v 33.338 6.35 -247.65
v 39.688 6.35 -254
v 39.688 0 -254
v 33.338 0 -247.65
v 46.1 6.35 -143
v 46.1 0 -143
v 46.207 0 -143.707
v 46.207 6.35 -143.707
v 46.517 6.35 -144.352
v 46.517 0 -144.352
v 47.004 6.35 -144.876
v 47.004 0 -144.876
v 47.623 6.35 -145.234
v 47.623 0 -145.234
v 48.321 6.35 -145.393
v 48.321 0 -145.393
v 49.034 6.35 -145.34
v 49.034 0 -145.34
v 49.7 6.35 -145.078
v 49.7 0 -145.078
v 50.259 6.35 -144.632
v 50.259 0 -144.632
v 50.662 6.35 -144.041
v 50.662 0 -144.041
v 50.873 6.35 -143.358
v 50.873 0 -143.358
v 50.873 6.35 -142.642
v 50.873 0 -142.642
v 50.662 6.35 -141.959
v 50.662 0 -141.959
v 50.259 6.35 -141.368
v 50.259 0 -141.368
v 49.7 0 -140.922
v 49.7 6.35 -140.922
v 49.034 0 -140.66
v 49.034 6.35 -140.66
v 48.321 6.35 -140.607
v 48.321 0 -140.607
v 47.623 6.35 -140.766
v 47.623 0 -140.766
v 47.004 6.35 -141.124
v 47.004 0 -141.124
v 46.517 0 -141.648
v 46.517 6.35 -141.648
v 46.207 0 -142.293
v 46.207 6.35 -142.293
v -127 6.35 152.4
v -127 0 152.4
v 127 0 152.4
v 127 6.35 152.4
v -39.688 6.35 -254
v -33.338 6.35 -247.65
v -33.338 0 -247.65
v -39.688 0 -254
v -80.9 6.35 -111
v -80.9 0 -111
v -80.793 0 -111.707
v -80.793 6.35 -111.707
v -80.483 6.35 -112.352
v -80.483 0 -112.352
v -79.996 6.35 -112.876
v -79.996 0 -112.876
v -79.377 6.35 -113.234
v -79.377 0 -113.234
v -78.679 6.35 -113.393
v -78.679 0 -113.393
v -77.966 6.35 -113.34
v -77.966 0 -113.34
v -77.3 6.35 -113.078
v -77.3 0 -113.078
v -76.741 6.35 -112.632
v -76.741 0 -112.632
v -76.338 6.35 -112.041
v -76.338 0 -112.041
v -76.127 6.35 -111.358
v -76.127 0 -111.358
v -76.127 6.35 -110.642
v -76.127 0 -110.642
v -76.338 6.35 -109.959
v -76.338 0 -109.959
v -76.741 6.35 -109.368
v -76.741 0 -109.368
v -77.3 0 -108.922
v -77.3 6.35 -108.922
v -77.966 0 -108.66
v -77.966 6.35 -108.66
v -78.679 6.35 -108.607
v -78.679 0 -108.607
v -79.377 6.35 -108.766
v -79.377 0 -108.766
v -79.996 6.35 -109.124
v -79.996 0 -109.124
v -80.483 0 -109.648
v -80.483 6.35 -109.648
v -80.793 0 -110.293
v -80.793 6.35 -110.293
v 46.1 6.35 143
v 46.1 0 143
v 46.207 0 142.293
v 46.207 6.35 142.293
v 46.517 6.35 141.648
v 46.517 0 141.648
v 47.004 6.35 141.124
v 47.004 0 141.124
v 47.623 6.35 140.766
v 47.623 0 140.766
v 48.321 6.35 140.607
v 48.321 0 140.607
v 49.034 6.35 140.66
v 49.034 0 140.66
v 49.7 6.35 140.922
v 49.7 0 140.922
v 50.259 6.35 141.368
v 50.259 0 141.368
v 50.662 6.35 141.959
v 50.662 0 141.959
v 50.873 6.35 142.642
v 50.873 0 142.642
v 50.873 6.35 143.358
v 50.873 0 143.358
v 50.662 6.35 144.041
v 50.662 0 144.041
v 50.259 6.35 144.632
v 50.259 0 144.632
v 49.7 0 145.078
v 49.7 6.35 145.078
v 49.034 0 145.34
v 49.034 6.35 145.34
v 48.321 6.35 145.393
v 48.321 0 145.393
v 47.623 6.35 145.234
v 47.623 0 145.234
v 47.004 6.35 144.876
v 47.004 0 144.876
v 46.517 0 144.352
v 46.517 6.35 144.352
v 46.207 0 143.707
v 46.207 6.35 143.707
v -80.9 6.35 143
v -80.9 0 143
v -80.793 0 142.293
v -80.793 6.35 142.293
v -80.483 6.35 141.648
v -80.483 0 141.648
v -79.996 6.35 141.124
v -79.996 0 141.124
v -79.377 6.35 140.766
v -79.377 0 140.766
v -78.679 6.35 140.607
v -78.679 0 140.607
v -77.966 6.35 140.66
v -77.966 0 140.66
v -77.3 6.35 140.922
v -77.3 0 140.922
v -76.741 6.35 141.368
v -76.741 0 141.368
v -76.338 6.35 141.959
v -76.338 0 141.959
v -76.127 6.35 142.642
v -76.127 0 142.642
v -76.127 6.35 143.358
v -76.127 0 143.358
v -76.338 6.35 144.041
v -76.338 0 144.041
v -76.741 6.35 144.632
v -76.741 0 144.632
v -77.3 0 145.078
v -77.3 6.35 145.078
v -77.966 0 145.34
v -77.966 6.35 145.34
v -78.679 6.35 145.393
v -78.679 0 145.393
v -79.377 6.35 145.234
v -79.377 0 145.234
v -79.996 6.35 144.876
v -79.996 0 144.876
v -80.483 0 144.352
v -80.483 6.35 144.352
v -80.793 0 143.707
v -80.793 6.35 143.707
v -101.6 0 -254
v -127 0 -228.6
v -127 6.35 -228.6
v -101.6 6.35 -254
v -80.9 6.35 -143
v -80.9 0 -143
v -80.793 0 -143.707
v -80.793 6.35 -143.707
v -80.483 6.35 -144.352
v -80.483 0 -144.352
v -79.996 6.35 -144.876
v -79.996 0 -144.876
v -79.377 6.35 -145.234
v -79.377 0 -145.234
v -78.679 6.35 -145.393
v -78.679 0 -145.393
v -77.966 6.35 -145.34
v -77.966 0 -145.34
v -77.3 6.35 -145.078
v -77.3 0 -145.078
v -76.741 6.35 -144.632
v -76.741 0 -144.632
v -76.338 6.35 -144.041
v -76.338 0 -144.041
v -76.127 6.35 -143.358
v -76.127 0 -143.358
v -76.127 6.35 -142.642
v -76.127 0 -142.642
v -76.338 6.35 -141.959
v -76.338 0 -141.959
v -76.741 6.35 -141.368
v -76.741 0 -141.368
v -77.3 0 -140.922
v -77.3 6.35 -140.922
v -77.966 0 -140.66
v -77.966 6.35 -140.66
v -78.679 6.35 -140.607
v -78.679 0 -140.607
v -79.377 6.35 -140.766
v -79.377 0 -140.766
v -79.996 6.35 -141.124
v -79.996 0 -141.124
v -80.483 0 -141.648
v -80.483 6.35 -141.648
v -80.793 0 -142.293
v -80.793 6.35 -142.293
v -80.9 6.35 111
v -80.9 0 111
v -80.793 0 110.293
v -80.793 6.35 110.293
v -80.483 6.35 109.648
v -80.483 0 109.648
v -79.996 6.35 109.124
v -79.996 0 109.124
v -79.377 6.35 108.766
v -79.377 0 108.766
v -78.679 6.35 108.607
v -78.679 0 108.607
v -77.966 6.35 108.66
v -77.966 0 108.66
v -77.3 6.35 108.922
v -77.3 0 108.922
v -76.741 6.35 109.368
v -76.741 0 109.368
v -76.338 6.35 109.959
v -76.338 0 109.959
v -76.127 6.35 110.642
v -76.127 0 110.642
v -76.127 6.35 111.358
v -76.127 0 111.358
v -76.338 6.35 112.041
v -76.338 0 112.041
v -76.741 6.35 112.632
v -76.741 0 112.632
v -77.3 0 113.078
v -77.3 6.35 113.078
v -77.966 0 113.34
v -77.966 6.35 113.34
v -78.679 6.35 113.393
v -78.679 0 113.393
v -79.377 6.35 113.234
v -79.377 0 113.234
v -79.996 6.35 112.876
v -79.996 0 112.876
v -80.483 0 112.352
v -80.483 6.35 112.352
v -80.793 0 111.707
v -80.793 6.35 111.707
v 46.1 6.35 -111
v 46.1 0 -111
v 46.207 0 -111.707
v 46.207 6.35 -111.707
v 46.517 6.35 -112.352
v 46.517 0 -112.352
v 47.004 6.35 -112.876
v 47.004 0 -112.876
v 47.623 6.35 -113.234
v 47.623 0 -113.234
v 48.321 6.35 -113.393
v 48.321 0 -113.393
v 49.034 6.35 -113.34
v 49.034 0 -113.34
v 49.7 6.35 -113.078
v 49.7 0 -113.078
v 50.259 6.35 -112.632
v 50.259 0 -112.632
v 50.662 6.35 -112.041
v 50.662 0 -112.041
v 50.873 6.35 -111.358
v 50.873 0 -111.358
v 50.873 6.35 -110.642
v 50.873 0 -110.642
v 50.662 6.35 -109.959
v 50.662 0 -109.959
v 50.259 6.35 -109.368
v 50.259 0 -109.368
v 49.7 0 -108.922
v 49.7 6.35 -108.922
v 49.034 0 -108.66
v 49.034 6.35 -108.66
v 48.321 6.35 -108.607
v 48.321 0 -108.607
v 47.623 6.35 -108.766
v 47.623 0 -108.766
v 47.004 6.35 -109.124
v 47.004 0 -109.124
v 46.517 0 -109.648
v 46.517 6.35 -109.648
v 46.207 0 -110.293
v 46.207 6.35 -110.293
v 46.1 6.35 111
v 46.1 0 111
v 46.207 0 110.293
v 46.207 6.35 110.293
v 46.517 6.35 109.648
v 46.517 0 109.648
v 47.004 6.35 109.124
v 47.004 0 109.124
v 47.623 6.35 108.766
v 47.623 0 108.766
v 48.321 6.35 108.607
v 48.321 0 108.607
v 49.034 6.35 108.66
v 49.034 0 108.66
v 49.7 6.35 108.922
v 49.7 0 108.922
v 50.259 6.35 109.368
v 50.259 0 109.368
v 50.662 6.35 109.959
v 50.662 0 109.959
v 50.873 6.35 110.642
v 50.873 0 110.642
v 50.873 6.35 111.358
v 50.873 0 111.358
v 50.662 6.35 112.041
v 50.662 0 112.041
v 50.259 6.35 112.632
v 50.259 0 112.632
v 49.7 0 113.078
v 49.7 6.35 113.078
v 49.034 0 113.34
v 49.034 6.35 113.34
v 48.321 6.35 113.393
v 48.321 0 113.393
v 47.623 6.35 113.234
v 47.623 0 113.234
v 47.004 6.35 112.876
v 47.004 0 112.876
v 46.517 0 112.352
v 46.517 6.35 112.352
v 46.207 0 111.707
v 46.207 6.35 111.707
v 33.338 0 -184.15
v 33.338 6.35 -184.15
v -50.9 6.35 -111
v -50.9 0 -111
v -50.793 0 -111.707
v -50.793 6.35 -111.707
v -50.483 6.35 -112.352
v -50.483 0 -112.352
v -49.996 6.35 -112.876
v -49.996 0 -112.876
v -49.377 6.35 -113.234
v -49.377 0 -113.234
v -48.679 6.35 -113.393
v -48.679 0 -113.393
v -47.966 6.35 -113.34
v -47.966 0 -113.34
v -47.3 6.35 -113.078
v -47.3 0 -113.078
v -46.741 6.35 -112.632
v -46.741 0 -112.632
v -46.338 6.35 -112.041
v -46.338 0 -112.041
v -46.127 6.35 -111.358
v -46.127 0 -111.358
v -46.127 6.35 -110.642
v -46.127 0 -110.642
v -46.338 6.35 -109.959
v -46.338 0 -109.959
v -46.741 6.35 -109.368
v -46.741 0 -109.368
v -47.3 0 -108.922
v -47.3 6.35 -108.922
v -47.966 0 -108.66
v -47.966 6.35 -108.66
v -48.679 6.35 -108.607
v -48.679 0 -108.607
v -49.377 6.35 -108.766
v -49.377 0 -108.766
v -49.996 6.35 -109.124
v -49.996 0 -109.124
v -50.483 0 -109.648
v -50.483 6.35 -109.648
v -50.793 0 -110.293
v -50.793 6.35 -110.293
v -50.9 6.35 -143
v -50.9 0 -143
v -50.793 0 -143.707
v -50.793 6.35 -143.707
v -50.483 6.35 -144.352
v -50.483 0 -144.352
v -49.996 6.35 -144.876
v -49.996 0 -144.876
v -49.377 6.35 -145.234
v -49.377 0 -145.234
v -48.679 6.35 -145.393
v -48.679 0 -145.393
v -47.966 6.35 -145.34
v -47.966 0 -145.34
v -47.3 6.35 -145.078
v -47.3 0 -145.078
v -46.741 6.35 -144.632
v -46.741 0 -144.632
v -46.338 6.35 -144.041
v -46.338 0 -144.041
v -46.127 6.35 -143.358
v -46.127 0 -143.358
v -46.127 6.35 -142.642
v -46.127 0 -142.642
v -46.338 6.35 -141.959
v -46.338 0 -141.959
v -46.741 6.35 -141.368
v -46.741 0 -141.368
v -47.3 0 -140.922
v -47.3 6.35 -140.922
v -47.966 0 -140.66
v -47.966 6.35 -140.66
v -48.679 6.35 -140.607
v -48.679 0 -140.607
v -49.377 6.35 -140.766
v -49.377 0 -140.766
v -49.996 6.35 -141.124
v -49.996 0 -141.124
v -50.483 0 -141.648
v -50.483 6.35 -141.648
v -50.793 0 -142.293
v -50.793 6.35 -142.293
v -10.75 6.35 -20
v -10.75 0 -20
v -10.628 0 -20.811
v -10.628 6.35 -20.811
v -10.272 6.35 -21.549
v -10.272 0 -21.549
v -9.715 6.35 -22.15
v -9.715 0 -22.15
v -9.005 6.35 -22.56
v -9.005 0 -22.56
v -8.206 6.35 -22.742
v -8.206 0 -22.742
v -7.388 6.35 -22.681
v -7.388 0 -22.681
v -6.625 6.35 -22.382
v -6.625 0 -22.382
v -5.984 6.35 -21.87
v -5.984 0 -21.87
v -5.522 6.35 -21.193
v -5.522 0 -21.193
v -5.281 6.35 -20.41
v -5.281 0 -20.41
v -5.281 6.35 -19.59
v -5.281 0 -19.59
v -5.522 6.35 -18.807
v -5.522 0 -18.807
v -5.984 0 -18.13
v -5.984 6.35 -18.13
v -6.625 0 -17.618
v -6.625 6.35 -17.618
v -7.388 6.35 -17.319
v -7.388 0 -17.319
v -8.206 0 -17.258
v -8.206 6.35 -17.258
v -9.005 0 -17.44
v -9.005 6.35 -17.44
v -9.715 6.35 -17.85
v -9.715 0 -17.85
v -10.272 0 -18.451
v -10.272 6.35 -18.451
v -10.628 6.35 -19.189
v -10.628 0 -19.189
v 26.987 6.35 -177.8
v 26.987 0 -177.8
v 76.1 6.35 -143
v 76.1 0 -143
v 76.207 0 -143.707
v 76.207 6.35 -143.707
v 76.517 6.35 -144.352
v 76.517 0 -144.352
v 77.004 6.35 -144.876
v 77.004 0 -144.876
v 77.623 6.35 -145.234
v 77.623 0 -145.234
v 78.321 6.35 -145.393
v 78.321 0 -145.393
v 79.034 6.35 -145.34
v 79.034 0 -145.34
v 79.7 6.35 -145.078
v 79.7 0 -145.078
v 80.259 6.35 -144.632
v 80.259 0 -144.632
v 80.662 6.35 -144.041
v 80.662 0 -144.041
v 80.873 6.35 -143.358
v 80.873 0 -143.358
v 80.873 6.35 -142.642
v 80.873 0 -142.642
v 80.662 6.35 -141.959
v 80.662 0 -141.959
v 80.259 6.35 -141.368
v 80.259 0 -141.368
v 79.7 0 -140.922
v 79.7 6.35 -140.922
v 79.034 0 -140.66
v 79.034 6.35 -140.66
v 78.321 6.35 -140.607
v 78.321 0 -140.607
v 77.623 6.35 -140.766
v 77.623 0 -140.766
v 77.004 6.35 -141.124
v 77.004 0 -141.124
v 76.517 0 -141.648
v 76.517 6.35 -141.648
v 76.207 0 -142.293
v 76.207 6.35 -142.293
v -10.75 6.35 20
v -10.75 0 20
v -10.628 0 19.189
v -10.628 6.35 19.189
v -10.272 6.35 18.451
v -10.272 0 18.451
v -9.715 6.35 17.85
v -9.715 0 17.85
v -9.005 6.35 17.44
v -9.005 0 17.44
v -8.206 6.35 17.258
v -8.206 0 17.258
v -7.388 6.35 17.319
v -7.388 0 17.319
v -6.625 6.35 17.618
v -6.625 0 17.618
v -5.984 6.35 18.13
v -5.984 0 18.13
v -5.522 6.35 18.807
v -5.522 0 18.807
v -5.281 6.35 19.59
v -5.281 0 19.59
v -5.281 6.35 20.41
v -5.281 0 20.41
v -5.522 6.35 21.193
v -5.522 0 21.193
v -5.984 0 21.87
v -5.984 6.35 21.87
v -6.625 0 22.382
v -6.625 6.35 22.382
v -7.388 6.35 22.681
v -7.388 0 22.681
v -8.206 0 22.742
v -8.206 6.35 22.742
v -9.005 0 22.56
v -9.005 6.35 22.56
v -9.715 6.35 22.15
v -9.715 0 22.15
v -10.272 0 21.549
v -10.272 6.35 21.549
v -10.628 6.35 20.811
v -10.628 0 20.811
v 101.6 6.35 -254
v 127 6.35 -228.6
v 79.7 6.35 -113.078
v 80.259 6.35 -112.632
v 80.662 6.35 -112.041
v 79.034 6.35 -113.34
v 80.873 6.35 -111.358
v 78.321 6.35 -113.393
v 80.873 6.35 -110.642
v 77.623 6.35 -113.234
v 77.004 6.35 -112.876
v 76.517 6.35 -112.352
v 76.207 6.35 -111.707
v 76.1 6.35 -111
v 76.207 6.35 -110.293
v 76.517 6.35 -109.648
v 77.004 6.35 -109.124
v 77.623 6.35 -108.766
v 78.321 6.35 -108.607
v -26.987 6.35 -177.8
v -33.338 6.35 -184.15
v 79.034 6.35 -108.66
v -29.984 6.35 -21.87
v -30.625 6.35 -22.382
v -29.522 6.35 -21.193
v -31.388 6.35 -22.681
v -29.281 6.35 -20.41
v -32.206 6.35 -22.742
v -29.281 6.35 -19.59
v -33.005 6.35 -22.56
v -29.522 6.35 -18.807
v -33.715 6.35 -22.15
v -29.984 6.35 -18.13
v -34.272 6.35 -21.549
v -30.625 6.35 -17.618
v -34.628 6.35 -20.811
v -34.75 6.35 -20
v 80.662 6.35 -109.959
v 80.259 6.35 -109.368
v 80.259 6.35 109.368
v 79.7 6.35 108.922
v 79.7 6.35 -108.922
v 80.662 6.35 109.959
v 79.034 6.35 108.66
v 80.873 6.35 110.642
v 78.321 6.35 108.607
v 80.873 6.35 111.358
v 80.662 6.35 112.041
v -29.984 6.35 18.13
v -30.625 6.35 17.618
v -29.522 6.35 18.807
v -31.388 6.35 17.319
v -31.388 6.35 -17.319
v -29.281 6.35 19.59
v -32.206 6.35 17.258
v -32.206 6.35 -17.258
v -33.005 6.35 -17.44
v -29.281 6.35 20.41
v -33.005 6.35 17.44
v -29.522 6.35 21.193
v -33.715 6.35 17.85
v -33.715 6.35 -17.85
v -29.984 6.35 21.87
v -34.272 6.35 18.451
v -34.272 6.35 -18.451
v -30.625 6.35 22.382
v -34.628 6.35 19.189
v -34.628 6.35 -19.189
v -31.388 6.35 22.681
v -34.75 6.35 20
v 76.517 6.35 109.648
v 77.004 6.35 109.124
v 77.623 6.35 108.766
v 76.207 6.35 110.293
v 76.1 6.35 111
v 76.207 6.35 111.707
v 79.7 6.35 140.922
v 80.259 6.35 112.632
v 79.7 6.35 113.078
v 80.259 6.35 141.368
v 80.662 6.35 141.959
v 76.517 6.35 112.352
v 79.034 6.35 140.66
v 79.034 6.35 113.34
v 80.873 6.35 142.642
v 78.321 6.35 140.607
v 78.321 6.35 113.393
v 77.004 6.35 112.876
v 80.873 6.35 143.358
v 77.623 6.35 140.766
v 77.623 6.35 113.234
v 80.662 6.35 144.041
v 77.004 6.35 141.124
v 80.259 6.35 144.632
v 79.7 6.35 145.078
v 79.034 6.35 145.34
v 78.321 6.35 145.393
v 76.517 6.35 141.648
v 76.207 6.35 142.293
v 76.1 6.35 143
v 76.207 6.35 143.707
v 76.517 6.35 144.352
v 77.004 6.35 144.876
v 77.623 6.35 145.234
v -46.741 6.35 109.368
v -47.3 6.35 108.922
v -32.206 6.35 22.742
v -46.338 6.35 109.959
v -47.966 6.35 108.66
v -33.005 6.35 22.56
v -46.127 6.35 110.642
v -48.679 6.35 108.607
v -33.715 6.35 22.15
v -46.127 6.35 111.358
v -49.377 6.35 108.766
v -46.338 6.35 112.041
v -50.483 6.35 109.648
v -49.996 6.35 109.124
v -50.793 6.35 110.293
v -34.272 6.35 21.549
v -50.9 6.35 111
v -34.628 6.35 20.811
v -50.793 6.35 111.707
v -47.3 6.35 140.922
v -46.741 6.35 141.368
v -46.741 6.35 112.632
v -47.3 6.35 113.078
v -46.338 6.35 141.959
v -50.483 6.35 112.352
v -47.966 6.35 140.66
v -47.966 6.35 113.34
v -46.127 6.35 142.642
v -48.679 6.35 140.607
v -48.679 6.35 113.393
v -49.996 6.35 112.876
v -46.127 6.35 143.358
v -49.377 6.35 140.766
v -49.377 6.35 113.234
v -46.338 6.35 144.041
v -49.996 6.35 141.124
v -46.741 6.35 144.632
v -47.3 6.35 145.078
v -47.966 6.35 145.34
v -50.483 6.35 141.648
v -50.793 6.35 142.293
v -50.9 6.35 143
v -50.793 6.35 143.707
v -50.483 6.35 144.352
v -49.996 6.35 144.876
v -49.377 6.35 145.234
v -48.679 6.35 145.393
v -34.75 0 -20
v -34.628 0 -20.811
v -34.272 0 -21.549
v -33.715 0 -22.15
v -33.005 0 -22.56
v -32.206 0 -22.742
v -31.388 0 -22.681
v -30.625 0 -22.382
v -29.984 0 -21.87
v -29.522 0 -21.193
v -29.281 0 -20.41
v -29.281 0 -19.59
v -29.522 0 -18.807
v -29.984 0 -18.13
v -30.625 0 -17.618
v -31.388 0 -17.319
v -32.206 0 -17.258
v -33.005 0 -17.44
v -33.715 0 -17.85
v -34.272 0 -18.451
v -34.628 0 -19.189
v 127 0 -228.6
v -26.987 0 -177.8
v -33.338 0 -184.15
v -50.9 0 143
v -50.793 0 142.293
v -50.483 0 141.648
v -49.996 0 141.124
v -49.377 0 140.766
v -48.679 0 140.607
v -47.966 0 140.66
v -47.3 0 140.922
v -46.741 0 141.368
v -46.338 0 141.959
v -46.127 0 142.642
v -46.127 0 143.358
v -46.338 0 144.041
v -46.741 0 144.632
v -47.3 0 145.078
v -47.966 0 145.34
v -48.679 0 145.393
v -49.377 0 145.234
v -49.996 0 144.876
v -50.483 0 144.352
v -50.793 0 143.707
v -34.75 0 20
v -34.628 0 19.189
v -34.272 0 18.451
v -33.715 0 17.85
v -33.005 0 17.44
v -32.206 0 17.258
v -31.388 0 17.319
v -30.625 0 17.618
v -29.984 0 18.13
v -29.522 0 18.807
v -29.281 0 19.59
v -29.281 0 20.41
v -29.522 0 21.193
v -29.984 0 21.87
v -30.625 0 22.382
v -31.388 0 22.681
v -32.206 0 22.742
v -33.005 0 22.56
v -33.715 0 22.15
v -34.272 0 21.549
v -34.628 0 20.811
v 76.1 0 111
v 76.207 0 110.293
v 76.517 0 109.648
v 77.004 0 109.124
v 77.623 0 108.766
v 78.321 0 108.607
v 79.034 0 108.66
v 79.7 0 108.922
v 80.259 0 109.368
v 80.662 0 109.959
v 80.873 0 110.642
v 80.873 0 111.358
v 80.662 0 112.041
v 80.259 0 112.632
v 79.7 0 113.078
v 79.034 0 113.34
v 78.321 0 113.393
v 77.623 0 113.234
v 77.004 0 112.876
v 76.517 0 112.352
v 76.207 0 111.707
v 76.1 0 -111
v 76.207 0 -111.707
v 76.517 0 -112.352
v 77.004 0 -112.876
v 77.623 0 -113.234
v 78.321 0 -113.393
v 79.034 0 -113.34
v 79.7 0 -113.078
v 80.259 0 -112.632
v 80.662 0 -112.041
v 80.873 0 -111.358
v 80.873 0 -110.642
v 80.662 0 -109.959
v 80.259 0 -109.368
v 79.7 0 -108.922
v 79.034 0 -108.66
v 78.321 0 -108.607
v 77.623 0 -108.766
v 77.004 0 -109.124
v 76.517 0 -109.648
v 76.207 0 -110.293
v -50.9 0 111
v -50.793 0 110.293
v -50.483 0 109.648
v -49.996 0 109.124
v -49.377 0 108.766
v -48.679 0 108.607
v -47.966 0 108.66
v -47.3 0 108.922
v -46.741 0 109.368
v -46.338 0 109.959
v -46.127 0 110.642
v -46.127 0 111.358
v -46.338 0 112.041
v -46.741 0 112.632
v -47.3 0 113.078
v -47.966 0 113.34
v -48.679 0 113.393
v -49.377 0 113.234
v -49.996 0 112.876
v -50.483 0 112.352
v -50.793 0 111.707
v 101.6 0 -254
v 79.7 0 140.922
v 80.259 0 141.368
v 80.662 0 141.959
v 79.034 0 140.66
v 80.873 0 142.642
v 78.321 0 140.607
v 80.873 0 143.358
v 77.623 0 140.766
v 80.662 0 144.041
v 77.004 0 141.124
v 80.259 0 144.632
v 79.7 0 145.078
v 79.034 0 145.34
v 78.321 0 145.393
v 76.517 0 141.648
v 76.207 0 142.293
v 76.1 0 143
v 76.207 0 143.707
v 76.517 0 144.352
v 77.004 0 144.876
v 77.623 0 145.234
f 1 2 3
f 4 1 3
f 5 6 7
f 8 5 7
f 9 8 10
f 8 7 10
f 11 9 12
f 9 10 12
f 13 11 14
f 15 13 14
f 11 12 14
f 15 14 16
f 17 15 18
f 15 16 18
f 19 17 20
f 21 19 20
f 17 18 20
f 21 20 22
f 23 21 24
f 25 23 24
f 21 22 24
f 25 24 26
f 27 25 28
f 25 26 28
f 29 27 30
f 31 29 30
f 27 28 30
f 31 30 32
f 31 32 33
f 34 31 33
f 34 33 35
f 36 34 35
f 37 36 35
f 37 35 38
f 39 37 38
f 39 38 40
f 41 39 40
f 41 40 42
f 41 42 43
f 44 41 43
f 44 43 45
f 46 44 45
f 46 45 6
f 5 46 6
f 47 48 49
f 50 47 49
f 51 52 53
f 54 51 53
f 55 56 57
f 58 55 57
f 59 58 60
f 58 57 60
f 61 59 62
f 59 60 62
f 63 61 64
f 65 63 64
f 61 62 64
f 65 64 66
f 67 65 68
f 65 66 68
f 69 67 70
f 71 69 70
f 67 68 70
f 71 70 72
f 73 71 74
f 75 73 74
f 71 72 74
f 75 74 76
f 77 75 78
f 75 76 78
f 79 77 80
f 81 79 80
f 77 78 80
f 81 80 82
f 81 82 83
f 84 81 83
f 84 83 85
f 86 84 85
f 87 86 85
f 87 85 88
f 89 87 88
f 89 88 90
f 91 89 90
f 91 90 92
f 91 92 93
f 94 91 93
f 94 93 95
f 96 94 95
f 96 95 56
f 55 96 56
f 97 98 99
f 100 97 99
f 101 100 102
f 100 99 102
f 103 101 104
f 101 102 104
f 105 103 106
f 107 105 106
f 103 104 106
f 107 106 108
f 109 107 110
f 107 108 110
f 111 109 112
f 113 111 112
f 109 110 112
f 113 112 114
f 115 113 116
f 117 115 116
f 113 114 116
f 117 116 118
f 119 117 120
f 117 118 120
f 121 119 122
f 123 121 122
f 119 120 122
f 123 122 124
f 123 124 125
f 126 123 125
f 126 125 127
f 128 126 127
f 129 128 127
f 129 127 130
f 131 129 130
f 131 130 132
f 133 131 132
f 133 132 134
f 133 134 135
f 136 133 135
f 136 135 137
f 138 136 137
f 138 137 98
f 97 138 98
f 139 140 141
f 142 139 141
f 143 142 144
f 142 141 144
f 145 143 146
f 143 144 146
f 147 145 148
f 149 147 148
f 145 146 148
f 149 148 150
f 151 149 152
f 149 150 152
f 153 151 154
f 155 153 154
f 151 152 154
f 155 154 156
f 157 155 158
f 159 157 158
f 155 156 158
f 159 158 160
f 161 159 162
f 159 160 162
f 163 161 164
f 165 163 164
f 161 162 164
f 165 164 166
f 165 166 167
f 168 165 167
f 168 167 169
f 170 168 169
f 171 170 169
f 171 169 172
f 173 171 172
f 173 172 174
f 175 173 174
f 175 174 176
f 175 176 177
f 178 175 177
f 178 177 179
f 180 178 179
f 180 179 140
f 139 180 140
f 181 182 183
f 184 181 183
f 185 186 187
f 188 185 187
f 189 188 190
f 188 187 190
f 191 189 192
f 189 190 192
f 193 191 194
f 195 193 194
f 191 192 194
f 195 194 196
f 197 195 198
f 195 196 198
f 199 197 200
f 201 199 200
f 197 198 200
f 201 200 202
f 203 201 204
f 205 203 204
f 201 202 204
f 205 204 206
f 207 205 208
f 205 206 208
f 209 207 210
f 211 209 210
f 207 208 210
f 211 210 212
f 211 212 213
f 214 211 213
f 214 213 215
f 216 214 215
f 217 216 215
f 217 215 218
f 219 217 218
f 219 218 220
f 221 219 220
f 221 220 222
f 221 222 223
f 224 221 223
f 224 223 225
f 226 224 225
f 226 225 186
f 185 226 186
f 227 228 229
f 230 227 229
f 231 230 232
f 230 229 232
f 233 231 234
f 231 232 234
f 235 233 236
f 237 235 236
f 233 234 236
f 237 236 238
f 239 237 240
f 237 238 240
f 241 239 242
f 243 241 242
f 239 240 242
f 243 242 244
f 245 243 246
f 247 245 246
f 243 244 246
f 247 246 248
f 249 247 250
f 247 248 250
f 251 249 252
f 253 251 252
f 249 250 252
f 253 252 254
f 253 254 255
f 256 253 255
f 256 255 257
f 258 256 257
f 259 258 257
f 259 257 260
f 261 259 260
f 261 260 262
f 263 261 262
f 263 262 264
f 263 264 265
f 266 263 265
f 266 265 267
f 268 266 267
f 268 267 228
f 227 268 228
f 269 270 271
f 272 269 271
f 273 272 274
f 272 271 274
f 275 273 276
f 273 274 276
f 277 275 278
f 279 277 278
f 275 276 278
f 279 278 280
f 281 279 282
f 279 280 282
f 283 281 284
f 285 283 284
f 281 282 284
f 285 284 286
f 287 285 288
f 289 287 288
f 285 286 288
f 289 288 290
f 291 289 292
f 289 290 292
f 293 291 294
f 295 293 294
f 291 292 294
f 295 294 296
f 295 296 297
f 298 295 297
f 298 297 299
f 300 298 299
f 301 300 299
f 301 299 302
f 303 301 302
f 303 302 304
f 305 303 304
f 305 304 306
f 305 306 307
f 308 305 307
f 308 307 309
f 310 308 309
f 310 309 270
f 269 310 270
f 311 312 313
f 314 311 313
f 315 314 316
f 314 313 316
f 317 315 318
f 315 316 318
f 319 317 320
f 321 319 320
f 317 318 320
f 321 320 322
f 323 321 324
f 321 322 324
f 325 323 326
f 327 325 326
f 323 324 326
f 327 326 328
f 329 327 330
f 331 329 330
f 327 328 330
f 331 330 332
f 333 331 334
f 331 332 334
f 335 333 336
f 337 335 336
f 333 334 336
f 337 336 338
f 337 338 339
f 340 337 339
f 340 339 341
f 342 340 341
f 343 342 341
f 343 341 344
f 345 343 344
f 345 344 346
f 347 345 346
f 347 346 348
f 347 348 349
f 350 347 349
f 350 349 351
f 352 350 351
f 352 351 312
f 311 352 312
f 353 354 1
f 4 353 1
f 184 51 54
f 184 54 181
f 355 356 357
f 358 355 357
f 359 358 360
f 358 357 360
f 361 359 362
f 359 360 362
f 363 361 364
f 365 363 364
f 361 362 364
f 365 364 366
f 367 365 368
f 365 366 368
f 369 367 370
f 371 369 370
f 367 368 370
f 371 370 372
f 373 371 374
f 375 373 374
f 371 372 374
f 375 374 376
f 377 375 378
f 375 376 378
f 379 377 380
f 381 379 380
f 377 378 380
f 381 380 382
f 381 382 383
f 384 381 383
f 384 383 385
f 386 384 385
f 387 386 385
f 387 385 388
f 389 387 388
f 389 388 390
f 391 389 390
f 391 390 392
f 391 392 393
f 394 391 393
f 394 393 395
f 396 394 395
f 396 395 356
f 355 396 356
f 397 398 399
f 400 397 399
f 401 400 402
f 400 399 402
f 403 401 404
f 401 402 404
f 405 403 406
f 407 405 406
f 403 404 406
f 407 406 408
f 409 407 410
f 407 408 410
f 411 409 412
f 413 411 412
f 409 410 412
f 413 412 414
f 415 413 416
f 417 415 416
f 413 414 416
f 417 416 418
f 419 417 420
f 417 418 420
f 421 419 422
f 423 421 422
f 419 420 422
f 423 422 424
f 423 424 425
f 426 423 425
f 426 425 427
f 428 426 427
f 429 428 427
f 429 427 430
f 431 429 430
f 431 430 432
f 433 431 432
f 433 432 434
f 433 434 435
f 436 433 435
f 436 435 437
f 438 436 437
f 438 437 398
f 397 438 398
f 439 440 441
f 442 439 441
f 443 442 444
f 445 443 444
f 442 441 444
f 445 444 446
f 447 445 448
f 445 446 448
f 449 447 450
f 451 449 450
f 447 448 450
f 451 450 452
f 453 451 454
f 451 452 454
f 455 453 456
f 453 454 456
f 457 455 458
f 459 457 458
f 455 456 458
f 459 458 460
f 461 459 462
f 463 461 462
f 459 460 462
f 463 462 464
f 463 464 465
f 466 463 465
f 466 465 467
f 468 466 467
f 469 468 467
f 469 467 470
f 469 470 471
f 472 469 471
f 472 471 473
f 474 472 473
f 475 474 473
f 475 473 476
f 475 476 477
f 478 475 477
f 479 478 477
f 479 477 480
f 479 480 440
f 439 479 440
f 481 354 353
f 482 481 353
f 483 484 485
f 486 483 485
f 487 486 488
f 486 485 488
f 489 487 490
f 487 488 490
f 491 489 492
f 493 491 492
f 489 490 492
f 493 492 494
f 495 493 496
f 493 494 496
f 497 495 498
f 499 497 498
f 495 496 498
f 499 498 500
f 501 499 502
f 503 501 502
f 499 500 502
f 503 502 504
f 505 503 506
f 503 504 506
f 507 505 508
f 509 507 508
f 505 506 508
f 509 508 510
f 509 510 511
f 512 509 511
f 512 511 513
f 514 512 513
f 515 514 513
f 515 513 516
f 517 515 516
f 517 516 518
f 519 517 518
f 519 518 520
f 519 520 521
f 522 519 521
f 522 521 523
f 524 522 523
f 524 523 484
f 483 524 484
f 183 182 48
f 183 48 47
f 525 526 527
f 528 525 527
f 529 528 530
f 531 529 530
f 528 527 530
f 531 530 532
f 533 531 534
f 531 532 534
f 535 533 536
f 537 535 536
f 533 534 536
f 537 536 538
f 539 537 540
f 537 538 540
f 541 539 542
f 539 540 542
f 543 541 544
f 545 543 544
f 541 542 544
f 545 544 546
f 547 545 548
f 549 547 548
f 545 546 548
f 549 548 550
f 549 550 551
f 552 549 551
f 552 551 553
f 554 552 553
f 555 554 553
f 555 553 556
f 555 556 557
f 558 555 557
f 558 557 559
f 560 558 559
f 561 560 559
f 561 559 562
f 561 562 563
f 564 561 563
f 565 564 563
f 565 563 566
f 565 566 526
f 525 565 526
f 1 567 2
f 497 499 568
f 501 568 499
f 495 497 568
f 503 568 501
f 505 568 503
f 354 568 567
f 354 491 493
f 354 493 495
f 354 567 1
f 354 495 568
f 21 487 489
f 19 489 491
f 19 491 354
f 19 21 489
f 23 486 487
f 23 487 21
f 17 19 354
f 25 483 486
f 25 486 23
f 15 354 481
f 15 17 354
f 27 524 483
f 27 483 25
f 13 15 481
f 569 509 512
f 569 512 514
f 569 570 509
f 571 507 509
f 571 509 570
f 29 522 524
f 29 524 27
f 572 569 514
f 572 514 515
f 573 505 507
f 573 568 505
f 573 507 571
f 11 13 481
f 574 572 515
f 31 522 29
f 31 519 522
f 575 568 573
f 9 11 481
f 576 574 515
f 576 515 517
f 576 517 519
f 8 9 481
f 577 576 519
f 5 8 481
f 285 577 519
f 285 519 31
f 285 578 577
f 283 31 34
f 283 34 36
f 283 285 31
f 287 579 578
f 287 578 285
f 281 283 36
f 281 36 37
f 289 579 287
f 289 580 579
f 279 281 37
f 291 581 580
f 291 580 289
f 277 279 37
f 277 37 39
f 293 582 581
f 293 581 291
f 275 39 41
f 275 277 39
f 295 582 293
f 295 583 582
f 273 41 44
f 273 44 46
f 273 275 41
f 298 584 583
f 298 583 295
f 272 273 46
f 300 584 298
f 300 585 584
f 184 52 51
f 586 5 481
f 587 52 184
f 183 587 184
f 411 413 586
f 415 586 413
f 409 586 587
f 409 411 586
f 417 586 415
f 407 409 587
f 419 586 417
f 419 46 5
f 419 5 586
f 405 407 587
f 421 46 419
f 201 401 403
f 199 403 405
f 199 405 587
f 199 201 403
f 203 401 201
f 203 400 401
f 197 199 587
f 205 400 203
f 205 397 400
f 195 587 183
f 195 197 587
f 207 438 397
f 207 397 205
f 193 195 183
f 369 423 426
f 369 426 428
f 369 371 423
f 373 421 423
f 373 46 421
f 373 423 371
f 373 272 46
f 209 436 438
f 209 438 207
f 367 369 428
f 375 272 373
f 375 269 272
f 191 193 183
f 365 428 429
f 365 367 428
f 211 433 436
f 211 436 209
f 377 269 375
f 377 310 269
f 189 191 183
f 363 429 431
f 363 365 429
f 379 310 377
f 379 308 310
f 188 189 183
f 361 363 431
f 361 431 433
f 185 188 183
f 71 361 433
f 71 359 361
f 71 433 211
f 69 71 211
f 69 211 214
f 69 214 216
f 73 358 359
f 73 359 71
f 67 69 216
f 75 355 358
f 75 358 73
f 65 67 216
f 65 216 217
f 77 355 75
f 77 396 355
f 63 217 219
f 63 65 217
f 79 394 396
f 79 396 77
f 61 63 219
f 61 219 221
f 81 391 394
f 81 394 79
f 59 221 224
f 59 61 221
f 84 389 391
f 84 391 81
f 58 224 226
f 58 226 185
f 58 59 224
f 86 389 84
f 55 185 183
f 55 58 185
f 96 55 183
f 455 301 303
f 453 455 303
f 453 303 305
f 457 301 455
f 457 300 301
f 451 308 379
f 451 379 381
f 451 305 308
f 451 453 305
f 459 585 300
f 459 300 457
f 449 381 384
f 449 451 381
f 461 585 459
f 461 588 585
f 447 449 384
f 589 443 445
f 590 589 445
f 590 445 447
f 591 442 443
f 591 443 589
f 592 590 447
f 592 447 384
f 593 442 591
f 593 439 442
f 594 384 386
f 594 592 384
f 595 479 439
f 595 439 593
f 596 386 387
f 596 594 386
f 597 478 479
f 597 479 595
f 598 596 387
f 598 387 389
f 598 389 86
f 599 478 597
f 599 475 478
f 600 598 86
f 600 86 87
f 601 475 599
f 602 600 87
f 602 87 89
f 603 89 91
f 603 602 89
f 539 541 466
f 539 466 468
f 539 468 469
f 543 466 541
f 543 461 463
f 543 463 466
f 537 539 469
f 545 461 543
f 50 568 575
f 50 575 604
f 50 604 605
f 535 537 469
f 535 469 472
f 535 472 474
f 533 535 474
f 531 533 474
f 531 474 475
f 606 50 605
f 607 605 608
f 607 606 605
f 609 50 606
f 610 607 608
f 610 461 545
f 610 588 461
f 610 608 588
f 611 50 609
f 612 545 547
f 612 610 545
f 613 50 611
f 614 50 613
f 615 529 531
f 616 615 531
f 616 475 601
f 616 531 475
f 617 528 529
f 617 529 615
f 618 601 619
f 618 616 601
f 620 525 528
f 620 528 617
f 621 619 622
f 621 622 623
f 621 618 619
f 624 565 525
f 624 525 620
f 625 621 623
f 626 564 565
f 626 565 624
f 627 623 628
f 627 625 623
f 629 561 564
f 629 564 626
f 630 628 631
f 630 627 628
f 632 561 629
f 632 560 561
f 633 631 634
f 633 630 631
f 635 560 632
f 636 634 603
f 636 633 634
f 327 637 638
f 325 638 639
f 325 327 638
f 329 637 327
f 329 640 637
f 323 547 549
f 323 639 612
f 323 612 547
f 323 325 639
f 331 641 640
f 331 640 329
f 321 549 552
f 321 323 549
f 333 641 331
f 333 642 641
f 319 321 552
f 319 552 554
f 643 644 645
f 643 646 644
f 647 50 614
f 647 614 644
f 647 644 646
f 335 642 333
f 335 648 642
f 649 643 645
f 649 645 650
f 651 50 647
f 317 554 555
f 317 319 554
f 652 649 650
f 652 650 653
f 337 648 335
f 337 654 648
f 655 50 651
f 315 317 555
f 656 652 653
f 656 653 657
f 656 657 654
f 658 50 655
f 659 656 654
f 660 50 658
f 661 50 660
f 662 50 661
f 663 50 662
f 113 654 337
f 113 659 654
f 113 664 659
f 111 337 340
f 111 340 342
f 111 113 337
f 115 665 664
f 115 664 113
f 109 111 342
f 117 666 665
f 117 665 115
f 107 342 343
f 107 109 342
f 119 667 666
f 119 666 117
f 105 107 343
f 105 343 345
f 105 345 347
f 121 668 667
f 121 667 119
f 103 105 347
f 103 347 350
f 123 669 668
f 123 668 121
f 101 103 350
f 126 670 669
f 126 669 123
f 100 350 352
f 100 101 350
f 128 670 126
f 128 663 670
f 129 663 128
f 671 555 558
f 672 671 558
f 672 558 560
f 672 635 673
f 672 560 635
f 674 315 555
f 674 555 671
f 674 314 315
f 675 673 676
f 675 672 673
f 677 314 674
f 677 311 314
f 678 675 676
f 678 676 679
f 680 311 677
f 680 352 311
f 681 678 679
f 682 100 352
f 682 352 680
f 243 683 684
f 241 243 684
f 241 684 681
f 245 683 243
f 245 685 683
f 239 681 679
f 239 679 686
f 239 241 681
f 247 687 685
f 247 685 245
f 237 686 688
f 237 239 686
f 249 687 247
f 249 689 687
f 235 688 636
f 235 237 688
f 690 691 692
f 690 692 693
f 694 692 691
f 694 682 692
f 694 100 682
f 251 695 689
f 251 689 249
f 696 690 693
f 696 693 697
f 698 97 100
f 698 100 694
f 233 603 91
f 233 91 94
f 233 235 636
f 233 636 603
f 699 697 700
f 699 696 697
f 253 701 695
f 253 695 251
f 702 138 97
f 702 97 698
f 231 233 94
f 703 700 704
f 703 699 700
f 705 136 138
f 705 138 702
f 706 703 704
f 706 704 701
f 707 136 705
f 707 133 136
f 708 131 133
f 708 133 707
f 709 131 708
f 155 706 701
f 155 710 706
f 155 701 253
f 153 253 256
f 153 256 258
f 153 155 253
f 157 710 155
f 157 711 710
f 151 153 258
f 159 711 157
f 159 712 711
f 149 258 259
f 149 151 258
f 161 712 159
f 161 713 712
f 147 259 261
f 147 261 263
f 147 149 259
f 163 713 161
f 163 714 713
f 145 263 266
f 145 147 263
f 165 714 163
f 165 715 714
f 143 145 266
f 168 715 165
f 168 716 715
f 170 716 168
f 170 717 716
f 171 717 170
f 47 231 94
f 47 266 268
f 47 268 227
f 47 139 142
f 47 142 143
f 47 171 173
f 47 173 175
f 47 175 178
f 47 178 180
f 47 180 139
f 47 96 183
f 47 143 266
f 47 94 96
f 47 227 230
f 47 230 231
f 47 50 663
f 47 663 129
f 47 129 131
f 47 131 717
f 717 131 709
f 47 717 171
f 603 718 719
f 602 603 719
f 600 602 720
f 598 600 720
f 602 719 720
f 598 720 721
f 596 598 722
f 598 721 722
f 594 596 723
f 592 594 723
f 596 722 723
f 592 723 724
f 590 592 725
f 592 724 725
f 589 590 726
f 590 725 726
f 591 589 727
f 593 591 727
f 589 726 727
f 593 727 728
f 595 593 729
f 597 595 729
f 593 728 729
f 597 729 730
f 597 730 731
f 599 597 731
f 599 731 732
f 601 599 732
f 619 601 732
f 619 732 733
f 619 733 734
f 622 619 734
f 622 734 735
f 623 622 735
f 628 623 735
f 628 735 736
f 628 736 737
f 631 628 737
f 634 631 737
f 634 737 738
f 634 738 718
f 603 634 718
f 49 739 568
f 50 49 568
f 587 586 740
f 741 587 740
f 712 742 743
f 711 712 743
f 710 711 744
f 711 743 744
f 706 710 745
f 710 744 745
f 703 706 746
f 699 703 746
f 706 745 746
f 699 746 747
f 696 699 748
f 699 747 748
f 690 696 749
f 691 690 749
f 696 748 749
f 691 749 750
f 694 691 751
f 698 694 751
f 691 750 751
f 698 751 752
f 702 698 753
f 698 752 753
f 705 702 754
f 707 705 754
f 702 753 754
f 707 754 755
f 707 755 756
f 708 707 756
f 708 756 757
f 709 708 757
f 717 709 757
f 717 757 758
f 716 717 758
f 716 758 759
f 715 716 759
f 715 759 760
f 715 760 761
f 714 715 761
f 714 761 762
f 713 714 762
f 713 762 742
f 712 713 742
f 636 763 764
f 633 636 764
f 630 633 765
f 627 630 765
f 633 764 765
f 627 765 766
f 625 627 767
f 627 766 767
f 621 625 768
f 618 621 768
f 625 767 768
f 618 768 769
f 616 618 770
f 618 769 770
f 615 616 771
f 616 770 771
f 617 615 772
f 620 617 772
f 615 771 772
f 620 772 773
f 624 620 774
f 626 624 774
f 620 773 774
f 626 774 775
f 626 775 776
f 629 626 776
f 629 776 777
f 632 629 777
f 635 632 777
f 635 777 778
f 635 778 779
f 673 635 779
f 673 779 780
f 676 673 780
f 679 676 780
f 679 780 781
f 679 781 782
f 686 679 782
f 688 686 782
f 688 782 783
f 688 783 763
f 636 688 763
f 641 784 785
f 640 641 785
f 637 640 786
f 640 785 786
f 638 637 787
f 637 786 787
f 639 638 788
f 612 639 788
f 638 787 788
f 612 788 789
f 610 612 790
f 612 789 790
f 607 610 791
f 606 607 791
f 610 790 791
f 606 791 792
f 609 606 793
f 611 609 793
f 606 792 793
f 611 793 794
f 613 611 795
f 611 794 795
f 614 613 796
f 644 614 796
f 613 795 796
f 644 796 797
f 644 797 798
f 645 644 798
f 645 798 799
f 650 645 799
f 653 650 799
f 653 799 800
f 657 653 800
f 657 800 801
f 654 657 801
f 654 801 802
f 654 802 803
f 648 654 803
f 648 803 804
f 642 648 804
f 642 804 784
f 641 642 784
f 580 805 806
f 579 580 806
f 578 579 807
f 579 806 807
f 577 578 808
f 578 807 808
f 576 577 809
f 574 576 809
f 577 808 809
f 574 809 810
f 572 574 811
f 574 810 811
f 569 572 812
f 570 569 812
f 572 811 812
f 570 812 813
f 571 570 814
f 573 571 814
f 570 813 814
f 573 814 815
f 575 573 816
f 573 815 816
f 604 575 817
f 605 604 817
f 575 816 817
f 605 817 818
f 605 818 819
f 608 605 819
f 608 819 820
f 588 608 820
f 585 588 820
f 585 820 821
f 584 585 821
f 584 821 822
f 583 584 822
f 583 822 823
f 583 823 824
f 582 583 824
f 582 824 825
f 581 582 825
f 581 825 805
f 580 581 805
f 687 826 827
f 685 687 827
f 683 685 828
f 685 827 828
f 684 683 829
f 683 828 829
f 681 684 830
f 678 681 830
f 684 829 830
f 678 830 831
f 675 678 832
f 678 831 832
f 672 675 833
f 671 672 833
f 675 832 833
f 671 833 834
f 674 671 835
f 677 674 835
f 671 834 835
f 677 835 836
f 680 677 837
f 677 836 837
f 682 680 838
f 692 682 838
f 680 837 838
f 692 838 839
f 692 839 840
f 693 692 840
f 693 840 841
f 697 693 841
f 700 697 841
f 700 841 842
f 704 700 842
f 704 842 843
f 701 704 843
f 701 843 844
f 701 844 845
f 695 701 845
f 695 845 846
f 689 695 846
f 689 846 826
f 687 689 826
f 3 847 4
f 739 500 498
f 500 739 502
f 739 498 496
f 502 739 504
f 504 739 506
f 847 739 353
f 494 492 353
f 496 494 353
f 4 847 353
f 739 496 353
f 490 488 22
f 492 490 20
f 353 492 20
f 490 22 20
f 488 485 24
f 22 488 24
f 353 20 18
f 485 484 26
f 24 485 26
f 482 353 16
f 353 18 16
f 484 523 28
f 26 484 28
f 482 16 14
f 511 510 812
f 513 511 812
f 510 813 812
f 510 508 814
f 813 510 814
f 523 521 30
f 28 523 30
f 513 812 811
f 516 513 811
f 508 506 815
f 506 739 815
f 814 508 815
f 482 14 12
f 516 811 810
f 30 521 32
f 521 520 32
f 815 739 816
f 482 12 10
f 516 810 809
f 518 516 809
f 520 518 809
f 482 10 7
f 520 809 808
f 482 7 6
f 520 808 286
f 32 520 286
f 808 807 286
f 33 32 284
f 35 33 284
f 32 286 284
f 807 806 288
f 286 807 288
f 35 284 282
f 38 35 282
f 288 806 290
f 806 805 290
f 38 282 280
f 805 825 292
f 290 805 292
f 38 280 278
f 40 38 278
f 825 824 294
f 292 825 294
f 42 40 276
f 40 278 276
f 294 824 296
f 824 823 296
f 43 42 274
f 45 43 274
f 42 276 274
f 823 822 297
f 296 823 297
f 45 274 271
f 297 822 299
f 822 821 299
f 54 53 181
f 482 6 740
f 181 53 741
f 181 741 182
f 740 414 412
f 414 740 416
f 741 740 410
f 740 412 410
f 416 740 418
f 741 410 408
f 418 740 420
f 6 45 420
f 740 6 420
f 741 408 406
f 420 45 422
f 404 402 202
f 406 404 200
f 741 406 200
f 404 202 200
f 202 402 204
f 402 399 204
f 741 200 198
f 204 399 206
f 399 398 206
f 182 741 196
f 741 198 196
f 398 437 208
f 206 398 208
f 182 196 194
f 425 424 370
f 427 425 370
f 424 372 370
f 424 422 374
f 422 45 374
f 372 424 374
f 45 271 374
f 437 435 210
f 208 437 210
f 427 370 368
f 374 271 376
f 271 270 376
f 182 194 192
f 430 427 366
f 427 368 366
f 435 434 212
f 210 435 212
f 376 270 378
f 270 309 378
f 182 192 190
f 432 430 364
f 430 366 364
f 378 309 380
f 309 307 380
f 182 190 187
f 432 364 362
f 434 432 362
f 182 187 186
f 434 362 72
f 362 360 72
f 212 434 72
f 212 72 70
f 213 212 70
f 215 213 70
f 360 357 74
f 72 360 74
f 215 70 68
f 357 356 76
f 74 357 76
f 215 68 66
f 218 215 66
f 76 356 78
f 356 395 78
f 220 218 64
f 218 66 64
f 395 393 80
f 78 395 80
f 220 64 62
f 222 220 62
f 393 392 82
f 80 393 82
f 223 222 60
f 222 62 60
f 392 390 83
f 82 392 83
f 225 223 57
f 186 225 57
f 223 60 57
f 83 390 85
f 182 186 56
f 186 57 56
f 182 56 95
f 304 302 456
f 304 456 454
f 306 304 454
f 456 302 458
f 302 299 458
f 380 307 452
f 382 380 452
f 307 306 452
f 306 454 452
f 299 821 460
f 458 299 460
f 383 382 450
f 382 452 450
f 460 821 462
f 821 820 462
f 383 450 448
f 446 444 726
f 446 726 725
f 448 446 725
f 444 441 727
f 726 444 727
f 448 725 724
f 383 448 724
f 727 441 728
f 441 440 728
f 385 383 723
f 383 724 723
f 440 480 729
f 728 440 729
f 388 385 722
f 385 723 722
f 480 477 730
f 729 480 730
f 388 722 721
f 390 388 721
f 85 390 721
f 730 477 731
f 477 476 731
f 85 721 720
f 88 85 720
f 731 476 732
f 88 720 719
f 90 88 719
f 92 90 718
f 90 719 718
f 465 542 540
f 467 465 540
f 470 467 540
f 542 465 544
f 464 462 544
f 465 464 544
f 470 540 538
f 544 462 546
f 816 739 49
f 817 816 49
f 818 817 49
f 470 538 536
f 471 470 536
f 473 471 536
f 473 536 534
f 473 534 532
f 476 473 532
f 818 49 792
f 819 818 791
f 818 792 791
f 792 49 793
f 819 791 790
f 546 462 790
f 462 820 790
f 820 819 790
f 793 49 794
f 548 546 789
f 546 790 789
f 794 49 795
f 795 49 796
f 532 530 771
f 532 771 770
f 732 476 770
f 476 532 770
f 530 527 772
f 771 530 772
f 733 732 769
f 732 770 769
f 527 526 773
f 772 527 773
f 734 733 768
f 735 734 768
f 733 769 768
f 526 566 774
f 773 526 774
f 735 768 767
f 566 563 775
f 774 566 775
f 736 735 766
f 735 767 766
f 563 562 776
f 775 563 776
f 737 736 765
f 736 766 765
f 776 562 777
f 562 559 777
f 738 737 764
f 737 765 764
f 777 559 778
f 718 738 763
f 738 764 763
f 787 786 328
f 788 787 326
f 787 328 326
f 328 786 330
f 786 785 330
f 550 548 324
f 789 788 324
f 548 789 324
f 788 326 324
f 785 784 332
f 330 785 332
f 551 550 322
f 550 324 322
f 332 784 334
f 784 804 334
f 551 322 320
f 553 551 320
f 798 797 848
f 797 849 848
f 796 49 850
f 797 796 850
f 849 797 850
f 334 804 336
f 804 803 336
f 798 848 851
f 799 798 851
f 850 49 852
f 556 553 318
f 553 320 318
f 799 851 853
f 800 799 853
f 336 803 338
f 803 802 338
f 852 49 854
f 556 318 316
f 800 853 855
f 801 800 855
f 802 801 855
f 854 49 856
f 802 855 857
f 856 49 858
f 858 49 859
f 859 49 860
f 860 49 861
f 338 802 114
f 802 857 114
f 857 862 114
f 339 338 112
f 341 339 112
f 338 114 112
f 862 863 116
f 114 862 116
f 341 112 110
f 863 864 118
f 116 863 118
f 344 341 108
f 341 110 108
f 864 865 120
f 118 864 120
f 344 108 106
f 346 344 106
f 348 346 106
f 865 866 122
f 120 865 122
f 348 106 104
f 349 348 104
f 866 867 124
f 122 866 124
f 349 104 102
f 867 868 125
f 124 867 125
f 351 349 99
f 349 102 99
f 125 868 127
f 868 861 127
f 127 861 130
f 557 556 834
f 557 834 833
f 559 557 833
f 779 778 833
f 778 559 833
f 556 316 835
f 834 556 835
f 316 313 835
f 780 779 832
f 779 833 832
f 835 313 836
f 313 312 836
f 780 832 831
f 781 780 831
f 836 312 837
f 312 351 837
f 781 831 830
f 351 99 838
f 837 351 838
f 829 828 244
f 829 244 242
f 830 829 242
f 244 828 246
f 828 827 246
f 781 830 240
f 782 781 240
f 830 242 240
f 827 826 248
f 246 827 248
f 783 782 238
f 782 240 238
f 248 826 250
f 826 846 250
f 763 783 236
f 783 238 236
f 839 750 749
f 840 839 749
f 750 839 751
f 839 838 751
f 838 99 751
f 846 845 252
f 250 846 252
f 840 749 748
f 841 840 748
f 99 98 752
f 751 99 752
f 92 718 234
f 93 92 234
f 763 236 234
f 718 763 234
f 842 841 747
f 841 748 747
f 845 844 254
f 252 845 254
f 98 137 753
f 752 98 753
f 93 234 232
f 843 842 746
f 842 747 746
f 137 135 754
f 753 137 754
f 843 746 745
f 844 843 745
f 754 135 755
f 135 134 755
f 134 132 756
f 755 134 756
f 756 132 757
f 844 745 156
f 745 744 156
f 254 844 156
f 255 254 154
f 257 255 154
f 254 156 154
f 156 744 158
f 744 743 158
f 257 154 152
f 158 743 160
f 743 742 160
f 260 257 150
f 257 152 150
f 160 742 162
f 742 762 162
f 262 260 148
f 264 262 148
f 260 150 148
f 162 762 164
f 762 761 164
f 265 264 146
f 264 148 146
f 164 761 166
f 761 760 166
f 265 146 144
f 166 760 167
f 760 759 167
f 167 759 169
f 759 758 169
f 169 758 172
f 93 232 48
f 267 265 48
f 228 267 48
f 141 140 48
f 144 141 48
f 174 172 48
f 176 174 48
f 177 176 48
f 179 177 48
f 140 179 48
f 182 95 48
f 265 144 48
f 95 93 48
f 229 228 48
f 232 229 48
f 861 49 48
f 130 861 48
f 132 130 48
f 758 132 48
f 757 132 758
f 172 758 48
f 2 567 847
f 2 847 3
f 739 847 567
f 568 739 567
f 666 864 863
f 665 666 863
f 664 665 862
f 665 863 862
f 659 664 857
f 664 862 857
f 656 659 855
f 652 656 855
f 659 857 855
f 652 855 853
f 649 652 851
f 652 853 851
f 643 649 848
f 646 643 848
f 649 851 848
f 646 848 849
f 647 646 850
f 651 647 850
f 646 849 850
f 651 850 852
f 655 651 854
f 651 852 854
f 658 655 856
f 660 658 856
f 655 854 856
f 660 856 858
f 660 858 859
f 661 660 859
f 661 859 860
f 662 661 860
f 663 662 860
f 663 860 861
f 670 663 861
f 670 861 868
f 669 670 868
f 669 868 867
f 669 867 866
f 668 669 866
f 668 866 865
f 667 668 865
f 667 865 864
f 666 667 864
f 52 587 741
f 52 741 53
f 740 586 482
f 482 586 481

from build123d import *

# Parameters (mm, degrees)
SKETCH2_W                = 254
SKETCH2_H                = 304.8
BOSS_EXTRUDE1_DEPTH      = 6.35
M4_CLEARANCE_HOLE1_D     = 4.8
M4_CLEARANCE_HOLE1_DEPTH = 6.35
SKETCH6_W                = 254
SKETCH6_H                = 6.35
BOSS_EXTRUDE2_DEPTH      = 101.6
CHAMFER1_SIZE            = 25.4
SKETCH7_W                = 66.675
SKETCH7_H                = 76.2
CUT_EXTRUDE1_DEPTH       = 7.35
CHAMFER2_SIZE            = 6.35
M5_CLEARANCE_HOLE1_D     = 5.5


with BuildPart() as part:
    # Sketch2 → Boss-Extrude1 (new body)
    with BuildSketch(Plane(origin=(0, 0, 0), x_dir=(1, 0, 0), z_dir=(0, 1, 0))):
        Rectangle(SKETCH2_W, SKETCH2_H)
    extrude(amount=BOSS_EXTRUDE1_DEPTH)

    # M4 Clearance Hole1
    with Locations(Plane(origin=(0, 6.35, 0), x_dir=(1, 0, 0), z_dir=(0, 1, 0))):
        with Locations((78.5, -111), (48.5, -111), (48.5, -143), (78.5, -143), (-48.5, -111), (-48.5, -143), (-78.5, -111), (-78.5, -143), (78.5, 143), (78.5, 111), (48.5, 143), (48.5, 111), (-48.5, 143), (-48.5, 111), (-78.5, 143), (-78.5, 111)):
            Hole(M4_CLEARANCE_HOLE1_D / 2, depth=M4_CLEARANCE_HOLE1_DEPTH)

    # Sketch6 → Boss-Extrude2 (add)
    with BuildSketch(Plane(origin=(0, 0, -152.4), x_dir=(-1, 0, 0), z_dir=(0, 0, -1))):
        with Locations((0, 3.175)):
            Rectangle(SKETCH6_W, SKETCH6_H)
    extrude(amount=BOSS_EXTRUDE2_DEPTH)

    # Chamfer1
    chamfer1_edges = [part.edges().sort_by_distance(p)[0] for p in [
        (127, 3.175, -254),
        (-127, 3.175, -254),
    ]]
    chamfer(chamfer1_edges, length=CHAMFER1_SIZE)

    # Sketch7 → Cut-Extrude1 (cut, through all)
    with BuildSketch(Plane(origin=(0, 6.35, 0), x_dir=(1, 0, 0), z_dir=(0, 1, 0))):
        with Locations((0, 215.9)):
            Rectangle(SKETCH7_W, SKETCH7_H)
    extrude(amount=-CUT_EXTRUDE1_DEPTH, mode=Mode.SUBTRACT)

    # Chamfer2
    chamfer2_edges = [part.edges().sort_by_distance(p)[0] for p in [
        (33.3375, 3.175, -254),
        (33.3375, 3.175, -177.8),
        (-33.3375, 3.175, -177.8),
        (-33.3375, 3.175, -254),
    ]]
    chamfer(chamfer2_edges, length=CHAMFER2_SIZE)

    # M5 Clearance Hole1 (through all)
    with Locations(Plane(origin=(0, 6.35, 0), x_dir=(1, 0, 0), z_dir=(0, 1, 0))):
        with Locations((-8, -20.000000026), (-8, 19.999999974), (-32, 19.999999974), (-32, -20.000000026)):
            Hole(M5_CLEARANCE_HOLE1_D / 2)


solid = part.part
